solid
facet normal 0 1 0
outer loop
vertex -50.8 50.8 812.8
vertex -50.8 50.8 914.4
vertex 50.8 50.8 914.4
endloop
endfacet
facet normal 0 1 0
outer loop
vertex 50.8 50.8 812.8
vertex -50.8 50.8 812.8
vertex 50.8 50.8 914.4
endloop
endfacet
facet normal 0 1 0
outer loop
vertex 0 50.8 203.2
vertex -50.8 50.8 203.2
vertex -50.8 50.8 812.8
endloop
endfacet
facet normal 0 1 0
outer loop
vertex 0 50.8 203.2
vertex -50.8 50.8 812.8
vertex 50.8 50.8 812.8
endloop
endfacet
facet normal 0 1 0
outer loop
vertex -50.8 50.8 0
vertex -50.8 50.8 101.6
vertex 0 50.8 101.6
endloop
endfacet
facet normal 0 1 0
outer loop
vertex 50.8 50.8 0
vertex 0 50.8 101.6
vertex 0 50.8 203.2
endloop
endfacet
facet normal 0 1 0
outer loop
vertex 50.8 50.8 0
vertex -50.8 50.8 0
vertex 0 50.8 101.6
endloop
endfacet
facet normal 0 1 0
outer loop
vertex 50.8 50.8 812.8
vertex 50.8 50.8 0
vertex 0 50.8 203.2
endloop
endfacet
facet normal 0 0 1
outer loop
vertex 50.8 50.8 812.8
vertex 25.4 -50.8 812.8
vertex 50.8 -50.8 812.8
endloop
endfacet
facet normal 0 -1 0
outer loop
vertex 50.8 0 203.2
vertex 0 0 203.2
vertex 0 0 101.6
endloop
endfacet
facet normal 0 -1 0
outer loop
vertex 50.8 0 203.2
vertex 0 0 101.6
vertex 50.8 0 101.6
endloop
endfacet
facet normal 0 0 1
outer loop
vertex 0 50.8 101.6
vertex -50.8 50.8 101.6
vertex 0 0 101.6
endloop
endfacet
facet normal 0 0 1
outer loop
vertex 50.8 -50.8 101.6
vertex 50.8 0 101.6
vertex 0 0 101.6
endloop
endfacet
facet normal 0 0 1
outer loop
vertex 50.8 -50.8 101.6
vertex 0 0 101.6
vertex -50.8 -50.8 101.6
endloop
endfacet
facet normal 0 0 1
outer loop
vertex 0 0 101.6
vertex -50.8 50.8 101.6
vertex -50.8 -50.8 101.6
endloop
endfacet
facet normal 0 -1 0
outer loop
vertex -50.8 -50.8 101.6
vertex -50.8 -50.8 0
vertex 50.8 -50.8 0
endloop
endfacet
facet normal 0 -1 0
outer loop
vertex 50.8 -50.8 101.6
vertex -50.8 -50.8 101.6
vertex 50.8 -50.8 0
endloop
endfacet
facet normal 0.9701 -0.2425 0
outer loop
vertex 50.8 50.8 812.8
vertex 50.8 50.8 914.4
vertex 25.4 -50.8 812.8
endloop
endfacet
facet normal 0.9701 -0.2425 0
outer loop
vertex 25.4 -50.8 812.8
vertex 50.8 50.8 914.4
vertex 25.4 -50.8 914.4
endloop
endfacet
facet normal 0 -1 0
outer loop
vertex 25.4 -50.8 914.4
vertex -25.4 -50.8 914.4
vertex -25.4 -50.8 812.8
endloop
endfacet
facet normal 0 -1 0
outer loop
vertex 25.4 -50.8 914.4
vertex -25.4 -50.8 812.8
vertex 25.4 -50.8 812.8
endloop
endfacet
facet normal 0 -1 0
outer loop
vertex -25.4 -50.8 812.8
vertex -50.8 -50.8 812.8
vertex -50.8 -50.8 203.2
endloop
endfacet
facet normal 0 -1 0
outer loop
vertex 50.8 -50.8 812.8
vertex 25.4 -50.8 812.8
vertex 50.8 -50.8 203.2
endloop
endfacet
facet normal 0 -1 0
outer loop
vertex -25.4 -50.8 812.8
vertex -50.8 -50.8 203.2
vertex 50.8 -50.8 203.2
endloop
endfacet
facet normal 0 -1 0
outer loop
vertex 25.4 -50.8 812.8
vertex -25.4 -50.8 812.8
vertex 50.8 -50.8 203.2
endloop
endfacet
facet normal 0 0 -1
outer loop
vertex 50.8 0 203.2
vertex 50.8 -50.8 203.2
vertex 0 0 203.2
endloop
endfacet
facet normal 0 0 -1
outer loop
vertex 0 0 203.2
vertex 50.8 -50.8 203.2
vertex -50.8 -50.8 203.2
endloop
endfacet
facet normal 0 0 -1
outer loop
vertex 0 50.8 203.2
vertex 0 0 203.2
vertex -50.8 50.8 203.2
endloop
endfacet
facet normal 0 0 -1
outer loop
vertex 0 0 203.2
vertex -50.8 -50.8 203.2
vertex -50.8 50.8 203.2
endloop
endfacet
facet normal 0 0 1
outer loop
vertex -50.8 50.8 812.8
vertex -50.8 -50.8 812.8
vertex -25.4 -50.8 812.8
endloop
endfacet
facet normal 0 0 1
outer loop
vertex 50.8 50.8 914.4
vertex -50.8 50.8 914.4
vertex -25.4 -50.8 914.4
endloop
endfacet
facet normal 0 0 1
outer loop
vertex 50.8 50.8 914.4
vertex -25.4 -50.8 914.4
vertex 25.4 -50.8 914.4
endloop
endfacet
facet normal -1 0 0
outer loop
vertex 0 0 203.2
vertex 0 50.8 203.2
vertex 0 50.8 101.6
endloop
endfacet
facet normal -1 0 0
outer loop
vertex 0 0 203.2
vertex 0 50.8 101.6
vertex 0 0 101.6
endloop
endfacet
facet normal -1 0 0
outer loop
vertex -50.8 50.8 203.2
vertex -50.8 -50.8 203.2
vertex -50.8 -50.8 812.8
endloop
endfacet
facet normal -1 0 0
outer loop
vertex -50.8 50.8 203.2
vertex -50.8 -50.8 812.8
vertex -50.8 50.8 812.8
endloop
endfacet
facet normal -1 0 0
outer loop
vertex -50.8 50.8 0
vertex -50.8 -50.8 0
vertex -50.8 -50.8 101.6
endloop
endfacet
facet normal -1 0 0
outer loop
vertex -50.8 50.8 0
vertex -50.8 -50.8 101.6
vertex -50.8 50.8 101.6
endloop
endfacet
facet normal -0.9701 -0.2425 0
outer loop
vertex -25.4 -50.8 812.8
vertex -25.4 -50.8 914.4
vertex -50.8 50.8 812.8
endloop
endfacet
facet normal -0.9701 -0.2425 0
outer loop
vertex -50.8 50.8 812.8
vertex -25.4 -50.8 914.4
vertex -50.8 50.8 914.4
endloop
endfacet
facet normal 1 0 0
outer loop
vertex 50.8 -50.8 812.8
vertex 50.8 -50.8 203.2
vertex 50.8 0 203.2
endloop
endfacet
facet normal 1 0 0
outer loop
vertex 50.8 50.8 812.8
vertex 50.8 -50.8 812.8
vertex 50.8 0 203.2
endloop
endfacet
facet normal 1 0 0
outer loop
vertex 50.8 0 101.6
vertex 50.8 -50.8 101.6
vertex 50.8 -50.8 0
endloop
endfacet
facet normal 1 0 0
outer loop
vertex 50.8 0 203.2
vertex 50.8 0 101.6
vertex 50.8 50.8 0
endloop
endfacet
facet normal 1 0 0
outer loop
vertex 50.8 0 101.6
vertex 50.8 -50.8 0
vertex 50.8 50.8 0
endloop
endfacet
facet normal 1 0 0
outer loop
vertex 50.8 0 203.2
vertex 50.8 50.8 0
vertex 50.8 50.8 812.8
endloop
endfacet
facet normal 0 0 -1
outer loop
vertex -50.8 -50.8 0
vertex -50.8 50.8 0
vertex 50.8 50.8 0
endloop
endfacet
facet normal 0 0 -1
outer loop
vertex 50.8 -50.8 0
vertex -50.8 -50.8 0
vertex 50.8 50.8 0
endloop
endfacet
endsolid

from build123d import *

# Parameters (mm, degrees)
F0_W     = 101.6
F0_H     = 101.6
F1_DEPTH = 914.4
F3_DEPTH = 101.6
F4_W     = 101.6
F4_H     = 101.6
F5_DEPTH = 50.8
F6_W     = 50.8
F6_H     = 101.6
F7_DEPTH = 50.8


with BuildPart() as f1:
    # F0 (on Top) → F1 (new body)
    with BuildSketch(Plane.XY):
        Rectangle(F0_W, F0_H)
    extrude(amount=F1_DEPTH)

    # F2 (on face) → F3 (cut)
    with BuildSketch(Plane.XY.offset(914.4)):
        Polygon((-25.4, -50.8), (-50.8, 50.8), (-50.8, -50.8), align=None)
        Polygon((50.8, -50.8), (50.8, 50.8), (25.4, -50.8), align=None)
    extrude(amount=-F3_DEPTH, mode=Mode.SUBTRACT)

    # F4 (on face) → F5 (cut)
    with BuildSketch(Plane.XZ.offset(50.8)):
        with Locations((0, 152.4)):
            Rectangle(F4_W, F4_H)
    extrude(amount=-F5_DEPTH, mode=Mode.SUBTRACT)

    # F6 (on face) → F7 (cut)
    with BuildSketch(Plane(origin=(-50.8, 0, 0), x_dir=(0, -1, 0), z_dir=(-1, 0, 0))):
        with Locations((-25.4, 152.4)):
            Rectangle(F6_W, F6_H)
        with Locations((25.4, 152.4)):
            Rectangle(F6_W, F6_H)
    extrude(amount=-F7_DEPTH, mode=Mode.SUBTRACT)


solid = f1.part
